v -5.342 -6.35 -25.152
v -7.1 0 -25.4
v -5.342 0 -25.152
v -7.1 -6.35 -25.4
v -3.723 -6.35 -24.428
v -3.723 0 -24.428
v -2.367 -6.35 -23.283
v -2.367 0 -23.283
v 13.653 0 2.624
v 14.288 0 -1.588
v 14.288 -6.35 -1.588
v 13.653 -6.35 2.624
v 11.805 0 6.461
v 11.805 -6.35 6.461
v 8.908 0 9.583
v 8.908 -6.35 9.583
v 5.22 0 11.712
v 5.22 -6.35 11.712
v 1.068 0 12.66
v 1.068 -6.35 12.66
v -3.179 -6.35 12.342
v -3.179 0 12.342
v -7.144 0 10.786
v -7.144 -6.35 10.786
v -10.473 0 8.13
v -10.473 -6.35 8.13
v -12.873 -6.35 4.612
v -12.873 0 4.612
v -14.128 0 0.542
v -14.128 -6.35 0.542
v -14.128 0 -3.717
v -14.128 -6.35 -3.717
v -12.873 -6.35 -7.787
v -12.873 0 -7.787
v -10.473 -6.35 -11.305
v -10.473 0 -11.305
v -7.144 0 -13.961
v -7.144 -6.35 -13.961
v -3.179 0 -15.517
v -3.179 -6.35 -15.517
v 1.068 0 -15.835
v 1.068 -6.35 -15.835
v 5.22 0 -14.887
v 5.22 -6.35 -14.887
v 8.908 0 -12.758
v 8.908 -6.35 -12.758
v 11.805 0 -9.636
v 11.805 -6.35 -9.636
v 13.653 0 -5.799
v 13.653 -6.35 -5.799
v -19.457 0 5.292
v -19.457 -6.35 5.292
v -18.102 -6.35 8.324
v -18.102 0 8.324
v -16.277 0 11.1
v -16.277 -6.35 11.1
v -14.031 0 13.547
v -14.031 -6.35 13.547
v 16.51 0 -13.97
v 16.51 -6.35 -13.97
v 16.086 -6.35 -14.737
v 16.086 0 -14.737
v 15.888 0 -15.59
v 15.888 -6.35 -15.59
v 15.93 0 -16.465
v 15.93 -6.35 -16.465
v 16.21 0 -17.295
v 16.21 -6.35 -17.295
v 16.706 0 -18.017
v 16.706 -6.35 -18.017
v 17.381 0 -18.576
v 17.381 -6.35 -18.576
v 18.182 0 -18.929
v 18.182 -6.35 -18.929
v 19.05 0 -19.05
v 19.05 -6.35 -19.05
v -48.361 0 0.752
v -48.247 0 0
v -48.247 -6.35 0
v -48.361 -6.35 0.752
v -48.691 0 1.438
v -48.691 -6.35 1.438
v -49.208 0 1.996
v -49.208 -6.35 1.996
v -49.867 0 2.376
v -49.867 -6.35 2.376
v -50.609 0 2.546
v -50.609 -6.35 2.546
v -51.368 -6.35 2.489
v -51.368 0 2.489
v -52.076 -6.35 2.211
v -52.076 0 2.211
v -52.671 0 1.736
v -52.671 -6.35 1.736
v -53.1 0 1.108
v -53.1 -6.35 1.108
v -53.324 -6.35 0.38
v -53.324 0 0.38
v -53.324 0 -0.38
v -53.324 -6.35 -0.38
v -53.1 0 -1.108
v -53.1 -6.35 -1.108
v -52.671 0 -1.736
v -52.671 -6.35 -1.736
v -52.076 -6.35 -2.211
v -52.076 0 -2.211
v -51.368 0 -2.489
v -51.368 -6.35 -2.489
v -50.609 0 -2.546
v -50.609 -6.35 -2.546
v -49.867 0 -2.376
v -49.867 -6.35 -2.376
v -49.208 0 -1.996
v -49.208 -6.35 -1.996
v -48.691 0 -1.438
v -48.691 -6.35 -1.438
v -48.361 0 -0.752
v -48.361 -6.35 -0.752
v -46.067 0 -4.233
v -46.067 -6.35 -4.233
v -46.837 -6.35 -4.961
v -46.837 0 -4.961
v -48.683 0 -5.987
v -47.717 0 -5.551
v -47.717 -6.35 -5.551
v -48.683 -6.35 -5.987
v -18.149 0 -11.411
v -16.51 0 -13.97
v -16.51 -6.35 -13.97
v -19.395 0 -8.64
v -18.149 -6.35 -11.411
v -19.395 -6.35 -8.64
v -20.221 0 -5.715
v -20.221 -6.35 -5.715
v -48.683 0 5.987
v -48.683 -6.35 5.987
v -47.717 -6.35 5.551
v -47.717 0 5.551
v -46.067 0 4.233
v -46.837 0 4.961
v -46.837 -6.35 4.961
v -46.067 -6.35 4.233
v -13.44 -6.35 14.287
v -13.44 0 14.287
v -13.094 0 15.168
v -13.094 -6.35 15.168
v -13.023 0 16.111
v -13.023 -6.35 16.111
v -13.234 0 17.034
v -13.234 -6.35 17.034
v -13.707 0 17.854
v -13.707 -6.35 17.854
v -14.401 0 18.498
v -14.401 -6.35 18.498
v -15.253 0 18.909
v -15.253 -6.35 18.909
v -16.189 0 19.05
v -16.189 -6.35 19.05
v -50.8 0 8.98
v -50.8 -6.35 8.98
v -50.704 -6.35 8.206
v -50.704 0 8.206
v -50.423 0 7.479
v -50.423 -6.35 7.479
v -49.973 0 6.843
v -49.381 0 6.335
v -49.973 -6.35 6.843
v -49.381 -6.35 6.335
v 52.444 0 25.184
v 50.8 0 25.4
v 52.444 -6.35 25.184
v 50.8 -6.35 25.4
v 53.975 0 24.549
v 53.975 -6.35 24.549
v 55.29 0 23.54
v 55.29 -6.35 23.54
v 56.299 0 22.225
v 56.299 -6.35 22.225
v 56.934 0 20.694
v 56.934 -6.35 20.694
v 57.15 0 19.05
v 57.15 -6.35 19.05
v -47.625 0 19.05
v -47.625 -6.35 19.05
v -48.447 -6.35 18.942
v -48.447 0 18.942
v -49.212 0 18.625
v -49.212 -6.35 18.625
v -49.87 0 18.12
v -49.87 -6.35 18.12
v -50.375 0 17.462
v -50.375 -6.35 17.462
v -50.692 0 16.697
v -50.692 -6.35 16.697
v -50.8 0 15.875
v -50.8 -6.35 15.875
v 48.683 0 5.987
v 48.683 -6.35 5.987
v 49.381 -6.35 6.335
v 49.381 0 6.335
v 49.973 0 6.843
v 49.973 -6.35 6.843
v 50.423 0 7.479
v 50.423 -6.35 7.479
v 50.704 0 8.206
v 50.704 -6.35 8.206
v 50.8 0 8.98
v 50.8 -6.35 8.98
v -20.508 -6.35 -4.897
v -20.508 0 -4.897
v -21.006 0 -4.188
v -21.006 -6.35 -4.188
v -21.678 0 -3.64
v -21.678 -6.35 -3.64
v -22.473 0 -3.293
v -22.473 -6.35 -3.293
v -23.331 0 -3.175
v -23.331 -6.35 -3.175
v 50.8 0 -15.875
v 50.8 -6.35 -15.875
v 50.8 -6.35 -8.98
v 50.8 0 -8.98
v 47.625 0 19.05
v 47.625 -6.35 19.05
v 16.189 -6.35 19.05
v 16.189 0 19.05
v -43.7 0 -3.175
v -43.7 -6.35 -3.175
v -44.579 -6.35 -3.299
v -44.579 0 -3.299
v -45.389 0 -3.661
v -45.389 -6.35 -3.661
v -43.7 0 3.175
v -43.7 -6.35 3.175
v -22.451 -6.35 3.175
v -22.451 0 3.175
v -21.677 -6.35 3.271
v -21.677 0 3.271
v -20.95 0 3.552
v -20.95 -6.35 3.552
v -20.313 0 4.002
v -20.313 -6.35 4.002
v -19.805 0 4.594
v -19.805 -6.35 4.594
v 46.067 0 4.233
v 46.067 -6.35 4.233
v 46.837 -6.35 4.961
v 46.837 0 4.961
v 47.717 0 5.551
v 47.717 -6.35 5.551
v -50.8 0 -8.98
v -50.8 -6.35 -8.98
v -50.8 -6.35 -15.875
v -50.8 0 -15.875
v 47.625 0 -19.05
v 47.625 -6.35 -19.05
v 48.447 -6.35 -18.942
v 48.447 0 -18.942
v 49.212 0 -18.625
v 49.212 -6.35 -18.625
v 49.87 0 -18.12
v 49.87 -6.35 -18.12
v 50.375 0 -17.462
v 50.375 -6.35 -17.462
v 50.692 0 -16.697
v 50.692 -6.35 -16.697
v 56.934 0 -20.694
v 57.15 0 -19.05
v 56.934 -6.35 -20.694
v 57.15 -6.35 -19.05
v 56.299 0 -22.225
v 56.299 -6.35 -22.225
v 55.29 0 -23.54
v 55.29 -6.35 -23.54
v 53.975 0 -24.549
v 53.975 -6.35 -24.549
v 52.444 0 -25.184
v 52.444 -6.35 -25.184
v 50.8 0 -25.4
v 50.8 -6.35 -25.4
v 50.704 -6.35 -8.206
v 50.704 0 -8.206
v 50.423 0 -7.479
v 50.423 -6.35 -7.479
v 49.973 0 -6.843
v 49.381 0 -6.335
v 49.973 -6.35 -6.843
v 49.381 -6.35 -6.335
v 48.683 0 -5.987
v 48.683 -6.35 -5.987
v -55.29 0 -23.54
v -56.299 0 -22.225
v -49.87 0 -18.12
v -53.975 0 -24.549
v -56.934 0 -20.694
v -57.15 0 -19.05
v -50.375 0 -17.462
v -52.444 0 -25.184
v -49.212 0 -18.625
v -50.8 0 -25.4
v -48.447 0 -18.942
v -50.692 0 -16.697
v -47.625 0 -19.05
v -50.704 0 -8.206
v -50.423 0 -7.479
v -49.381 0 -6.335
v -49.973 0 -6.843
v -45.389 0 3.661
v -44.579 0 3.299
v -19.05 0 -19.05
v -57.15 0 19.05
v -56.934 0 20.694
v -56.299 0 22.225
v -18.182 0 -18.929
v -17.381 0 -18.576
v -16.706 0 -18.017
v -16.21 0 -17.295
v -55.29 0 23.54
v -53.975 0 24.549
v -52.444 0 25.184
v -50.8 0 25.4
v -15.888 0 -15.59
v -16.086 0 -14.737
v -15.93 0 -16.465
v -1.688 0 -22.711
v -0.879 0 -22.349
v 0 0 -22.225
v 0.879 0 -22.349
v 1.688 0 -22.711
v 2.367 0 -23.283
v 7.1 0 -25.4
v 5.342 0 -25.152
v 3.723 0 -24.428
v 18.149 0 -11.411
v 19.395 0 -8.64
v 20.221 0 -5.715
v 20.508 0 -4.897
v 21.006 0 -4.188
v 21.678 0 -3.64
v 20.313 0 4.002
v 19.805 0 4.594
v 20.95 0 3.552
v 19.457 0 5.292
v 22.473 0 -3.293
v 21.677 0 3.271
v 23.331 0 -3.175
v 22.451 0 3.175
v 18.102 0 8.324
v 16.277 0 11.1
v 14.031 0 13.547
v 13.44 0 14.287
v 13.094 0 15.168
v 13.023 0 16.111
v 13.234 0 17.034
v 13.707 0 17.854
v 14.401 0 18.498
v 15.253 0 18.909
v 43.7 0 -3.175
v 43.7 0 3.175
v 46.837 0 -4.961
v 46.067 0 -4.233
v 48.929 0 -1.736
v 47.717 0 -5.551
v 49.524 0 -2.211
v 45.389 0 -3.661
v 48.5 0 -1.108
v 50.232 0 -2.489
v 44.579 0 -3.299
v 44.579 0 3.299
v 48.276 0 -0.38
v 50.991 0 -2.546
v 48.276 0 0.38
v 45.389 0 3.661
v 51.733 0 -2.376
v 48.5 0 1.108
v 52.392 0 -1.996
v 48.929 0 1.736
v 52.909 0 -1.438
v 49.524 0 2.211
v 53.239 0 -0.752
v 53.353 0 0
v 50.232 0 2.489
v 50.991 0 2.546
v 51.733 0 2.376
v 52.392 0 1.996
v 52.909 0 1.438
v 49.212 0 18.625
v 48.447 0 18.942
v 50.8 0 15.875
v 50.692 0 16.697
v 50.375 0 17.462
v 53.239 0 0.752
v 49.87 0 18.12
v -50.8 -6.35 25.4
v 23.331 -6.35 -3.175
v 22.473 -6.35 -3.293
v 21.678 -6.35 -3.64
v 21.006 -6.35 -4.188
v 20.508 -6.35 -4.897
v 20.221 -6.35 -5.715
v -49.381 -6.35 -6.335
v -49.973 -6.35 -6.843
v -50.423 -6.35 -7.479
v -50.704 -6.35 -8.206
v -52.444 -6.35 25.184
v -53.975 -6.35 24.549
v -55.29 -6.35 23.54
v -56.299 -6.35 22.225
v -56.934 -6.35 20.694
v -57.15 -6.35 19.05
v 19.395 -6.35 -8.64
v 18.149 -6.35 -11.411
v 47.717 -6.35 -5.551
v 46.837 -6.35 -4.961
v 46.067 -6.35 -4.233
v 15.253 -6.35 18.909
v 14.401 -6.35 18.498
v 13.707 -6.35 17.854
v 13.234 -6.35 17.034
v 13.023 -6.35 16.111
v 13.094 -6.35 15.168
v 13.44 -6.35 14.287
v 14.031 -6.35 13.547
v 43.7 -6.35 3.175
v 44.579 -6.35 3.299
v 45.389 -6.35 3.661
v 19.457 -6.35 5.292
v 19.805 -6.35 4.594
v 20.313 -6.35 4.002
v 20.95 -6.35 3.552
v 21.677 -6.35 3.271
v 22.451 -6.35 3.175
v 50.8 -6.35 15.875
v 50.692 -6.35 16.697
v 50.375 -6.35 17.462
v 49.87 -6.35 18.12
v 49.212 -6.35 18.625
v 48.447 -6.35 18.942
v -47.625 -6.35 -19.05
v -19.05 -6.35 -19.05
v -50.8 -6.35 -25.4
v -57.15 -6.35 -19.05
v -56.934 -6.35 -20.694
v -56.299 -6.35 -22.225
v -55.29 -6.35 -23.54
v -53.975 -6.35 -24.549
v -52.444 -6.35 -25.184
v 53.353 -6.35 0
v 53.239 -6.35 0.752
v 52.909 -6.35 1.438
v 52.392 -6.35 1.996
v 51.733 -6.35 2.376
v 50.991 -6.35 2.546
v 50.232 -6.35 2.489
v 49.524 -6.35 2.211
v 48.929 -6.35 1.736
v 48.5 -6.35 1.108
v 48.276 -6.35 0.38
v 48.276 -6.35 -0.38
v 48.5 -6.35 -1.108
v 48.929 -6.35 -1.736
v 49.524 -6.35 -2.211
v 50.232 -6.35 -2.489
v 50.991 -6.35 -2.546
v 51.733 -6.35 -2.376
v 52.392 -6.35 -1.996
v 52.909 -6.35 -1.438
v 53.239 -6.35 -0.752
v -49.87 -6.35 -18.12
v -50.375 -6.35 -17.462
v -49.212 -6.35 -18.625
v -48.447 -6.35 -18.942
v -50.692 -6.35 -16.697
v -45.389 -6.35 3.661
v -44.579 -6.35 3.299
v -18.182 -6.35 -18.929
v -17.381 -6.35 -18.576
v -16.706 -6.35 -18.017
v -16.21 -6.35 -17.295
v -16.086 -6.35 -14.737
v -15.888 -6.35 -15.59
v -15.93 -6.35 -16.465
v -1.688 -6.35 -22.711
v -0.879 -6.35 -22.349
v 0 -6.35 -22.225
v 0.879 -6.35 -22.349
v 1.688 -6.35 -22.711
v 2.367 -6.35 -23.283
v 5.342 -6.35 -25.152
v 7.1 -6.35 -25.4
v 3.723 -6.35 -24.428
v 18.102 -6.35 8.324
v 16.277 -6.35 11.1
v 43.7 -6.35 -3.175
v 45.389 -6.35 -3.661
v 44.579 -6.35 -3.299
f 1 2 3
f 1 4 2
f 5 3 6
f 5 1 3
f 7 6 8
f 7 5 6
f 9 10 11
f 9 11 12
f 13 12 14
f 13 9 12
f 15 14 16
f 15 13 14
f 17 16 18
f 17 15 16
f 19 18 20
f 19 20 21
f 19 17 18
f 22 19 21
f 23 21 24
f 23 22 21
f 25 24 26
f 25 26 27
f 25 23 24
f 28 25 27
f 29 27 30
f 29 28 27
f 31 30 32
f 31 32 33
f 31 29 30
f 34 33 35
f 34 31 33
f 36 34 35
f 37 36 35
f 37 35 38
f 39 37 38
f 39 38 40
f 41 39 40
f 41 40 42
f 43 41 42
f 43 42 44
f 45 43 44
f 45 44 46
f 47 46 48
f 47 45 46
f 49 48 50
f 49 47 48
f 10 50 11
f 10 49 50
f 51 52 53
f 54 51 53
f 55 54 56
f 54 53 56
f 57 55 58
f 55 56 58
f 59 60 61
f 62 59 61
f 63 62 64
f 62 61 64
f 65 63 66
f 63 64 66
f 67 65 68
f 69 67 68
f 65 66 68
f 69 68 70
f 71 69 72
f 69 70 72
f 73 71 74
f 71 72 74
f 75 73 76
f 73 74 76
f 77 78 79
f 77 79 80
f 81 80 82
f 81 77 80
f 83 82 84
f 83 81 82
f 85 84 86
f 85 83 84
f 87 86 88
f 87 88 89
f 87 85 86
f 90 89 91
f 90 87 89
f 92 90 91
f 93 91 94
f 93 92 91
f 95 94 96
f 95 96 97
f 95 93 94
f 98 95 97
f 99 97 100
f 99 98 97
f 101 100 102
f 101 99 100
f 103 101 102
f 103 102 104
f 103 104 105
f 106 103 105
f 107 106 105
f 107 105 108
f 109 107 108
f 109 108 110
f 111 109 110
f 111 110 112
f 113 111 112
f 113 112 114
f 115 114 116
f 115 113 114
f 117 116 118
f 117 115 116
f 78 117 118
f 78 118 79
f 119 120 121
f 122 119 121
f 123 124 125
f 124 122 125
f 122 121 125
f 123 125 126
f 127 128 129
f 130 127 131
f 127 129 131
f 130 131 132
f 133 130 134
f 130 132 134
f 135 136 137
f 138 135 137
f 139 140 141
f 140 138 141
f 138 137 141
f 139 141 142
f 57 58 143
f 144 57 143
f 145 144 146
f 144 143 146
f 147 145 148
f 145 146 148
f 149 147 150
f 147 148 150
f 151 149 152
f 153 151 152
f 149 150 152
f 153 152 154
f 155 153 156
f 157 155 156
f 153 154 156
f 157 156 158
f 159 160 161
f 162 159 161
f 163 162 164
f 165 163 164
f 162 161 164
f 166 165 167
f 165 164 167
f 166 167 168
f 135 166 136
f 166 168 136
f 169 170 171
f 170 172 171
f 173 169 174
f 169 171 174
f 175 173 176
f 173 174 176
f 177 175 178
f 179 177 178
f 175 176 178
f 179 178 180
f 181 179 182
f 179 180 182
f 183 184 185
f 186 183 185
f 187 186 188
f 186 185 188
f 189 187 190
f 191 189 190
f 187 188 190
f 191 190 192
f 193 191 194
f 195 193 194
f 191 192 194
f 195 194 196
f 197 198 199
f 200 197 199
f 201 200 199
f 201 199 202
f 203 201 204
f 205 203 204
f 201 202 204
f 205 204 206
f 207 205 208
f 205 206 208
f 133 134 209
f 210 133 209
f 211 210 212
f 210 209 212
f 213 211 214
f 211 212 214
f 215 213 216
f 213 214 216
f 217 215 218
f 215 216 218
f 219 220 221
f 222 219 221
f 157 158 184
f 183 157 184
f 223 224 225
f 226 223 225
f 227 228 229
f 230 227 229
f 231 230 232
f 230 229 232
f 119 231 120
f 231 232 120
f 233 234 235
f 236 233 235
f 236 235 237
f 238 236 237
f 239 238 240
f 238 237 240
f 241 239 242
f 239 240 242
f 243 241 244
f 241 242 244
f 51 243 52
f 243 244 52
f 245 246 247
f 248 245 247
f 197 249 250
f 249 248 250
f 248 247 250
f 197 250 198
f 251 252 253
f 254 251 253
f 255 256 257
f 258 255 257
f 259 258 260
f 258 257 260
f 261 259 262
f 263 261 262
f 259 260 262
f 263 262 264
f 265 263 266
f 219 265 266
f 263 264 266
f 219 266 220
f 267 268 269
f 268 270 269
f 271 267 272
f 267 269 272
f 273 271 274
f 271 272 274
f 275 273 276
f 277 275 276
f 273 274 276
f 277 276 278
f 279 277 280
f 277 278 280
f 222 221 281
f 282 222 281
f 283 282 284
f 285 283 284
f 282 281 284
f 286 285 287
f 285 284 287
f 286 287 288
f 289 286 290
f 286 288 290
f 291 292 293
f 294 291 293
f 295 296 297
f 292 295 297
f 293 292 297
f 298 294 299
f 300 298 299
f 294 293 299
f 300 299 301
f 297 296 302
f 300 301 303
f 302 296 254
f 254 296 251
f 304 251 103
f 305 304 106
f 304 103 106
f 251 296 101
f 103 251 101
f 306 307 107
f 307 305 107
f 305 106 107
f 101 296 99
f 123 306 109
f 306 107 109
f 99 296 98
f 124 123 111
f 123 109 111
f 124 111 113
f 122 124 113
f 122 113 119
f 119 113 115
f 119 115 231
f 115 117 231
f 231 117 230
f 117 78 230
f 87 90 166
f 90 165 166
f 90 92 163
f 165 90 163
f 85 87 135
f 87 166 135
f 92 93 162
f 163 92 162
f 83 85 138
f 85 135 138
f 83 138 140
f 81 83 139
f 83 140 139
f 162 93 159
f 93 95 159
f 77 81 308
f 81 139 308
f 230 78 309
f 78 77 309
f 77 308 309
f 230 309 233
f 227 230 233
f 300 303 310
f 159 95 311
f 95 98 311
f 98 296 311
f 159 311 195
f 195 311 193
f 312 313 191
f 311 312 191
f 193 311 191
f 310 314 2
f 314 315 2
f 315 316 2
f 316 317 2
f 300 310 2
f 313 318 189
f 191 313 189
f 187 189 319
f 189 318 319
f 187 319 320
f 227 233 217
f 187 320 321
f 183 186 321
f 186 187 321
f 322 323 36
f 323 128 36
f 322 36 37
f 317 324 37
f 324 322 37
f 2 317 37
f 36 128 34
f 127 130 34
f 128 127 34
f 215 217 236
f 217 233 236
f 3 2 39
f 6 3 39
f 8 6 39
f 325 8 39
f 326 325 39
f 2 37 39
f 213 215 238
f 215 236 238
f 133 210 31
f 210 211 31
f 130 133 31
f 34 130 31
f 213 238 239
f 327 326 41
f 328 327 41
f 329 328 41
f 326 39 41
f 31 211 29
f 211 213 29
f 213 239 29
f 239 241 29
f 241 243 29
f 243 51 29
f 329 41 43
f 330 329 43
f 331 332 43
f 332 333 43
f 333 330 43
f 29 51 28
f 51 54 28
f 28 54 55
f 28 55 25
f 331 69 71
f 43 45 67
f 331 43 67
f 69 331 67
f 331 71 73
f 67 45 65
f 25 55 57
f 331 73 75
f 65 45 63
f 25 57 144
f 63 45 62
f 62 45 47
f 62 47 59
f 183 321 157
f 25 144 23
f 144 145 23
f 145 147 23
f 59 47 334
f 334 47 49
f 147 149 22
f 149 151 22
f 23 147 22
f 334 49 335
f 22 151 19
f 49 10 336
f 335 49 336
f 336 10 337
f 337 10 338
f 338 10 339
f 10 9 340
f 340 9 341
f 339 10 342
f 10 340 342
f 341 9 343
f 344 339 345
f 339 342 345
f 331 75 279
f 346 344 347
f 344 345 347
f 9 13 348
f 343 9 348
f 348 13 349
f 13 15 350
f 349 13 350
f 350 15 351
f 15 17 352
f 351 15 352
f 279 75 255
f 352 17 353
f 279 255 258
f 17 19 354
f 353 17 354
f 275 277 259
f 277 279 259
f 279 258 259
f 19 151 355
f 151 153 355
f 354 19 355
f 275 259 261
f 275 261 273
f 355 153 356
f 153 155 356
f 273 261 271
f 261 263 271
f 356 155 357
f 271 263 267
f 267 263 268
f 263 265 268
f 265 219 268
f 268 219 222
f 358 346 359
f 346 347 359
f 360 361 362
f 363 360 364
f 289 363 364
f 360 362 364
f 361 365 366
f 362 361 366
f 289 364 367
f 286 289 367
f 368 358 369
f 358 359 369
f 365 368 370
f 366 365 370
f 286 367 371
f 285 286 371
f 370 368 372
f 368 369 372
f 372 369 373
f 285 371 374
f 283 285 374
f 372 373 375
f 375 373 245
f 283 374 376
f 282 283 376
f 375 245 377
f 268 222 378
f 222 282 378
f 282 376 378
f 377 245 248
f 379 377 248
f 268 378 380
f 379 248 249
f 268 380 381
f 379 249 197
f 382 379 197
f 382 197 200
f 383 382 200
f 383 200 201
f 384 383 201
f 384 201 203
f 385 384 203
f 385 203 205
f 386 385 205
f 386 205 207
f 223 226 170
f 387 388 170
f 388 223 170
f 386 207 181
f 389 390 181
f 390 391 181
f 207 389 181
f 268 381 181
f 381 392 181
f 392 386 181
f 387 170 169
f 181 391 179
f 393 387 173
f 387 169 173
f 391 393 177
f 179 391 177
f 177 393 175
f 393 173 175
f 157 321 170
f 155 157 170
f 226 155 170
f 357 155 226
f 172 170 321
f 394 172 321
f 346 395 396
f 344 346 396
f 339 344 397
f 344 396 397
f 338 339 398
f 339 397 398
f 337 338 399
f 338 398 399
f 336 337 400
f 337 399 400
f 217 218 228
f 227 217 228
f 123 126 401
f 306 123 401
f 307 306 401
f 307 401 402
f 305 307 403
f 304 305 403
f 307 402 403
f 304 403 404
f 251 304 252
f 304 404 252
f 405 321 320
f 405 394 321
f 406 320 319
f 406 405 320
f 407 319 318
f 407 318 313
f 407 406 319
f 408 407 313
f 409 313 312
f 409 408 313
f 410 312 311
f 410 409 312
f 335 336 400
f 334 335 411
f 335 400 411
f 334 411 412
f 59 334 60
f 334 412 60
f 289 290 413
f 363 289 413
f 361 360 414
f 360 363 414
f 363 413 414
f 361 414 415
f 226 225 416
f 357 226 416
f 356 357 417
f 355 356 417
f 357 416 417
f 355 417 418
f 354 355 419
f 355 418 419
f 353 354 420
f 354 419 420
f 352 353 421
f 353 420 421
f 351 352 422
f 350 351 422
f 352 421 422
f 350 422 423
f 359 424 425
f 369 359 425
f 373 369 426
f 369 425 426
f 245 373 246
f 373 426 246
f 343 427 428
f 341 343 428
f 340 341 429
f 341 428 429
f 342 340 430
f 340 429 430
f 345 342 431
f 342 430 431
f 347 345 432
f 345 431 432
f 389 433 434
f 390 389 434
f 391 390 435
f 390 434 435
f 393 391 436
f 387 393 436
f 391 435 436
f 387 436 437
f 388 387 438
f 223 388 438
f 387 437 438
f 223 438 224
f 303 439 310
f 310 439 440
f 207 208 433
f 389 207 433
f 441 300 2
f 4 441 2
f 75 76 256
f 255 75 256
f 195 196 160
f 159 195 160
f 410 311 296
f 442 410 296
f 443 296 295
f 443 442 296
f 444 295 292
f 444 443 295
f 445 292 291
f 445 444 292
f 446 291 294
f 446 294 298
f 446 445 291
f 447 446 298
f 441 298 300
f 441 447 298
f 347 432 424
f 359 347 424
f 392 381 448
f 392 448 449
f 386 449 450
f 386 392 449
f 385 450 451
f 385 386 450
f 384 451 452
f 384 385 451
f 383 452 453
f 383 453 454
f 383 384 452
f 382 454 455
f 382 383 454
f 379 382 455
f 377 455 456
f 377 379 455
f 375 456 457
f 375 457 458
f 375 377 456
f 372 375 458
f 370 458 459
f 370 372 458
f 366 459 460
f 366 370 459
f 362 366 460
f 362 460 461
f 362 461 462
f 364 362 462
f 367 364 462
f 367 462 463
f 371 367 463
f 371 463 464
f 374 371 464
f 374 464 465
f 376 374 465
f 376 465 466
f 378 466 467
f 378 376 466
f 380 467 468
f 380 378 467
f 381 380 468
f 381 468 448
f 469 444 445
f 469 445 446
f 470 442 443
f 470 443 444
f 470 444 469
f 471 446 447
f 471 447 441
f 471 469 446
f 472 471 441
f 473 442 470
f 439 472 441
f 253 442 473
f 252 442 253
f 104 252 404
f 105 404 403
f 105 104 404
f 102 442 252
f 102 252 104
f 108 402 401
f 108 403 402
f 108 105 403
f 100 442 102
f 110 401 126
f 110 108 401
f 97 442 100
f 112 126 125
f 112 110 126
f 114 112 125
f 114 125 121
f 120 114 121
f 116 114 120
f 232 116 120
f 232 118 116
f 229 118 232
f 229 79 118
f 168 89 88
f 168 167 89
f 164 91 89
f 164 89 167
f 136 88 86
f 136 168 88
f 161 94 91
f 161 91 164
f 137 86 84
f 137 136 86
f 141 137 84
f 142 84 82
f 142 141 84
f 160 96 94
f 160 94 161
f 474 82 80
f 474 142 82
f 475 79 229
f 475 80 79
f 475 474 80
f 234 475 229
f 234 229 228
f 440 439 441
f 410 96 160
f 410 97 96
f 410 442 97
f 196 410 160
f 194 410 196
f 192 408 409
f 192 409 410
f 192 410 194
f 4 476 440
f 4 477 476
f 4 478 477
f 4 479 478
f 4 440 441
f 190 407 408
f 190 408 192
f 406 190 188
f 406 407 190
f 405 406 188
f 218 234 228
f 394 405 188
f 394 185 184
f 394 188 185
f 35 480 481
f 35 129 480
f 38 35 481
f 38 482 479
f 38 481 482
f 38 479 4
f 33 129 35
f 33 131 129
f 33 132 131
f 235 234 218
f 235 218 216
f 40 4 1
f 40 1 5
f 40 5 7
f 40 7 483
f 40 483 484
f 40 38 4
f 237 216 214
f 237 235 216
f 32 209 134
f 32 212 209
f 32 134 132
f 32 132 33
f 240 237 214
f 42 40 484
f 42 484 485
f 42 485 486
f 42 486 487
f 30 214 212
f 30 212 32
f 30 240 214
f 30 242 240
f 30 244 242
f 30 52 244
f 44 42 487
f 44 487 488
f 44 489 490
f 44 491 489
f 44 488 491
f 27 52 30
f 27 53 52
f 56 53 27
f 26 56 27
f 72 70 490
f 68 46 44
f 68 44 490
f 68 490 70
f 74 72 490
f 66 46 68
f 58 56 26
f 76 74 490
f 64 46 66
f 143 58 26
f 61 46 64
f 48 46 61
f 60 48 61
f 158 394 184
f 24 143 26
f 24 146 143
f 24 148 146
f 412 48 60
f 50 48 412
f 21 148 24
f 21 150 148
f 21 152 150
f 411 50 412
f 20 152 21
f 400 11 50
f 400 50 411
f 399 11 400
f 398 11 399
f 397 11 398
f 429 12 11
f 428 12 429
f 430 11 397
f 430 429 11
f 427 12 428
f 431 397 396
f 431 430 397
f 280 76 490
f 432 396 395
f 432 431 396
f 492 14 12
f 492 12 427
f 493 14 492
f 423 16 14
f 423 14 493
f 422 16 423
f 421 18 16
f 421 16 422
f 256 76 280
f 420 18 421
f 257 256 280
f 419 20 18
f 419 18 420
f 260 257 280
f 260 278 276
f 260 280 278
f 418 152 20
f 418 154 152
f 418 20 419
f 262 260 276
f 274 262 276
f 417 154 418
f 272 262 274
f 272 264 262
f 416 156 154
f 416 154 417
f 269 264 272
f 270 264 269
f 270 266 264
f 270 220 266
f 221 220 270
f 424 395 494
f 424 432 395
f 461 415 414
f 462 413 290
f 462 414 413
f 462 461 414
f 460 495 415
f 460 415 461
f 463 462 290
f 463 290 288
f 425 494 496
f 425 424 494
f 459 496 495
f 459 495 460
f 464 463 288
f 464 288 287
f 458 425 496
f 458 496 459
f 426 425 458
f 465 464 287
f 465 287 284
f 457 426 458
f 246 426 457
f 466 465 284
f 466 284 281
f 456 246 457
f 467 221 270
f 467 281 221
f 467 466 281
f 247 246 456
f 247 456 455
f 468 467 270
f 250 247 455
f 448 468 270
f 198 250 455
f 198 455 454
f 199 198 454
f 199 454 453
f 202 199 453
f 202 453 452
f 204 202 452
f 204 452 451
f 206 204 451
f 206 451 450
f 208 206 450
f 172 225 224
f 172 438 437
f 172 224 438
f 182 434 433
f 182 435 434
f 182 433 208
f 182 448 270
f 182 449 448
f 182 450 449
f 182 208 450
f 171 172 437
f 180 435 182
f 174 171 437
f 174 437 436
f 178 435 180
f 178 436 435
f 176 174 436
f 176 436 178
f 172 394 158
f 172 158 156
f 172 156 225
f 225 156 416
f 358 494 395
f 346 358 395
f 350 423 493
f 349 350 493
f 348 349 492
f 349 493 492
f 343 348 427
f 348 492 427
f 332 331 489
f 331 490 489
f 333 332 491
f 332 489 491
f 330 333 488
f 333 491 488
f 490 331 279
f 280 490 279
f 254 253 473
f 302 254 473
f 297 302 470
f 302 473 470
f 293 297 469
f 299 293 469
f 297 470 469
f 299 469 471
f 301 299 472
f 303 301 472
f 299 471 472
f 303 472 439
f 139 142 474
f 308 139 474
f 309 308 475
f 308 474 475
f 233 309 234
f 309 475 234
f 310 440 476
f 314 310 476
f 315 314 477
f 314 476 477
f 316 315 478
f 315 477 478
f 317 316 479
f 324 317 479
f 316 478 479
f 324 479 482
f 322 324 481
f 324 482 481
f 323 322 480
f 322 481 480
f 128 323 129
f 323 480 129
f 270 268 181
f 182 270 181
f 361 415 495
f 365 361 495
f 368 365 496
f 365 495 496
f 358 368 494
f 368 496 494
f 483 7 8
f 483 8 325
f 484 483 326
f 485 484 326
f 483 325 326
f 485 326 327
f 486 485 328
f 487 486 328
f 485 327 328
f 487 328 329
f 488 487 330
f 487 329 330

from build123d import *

# Parameters (mm, degrees)
F0_R     = 14.2875
F0_R_2   = 2.5527
F1_DEPTH = 6.35
F2_R     = 6.35
F4_DEPTH = 25.4


with BuildPart() as f1:
    # F0 (on Front) → F1 (new body)
    with BuildSketch(Plane.XZ):
        with BuildLine():
            Line((57.15, 25.4), (-57.15, 25.4))
            Line((-57.15, 25.4), (-57.15, -25.4))
            Line((-57.15, -25.4), (-3.175, -25.4))
            ThreePointArc((-3.175, -25.4), (0, -22.225), (3.175, -25.4))
            Line((3.175, -25.4), (57.15, -25.4))
            Line((57.15, -25.4), (57.15, 25.4))
        make_face()
        with Locations((0, -1.5875)):
            Circle(F0_R, mode=Mode.SUBTRACT)
        with Locations((-50.8, 0)):
            Circle(F0_R_2, mode=Mode.SUBTRACT)
        with Locations((50.8, 0)):
            Circle(F0_R_2, mode=Mode.SUBTRACT)
    extrude(amount=F1_DEPTH)

    # F2
    f2_edges = [f1.edges().sort_by_distance(p)[0] for p in [
        (-57.15, -3.175, 25.4),
        (-57.15, -3.175, -25.4),
        (57.15, -3.175, -25.4),
        (57.15, -3.175, 25.4),
        (-3.175, -3.175, -25.4),
        (3.175, -3.175, -25.4),
    ]]
    fillet(f2_edges, radius=F2_R)

    # F3 (on face) → F4 (cut)
    with BuildSketch(Plane.XZ.offset(6.35)):
        with BuildLine():
            ThreePointArc((-46.066989, 4.233333), (-44.996672, 3.451635), (-43.700484, 3.175))
            Line((-43.700484, 3.175), (-22.45064, 3.175))
            ThreePointArc((-22.45064, 3.175), (-20.617553, 3.757623), (-19.457222, 5.291667))
            ThreePointArc((-19.457222, 5.291667), (-17.245237, 9.748647), (-14.030802, 13.546667))
            ThreePointArc((-14.030802, 13.546667), (-13.233623, 17.034346), (-16.189387, 19.05))
            Line((-16.189387, 19.05), (-47.625, 19.05))
            ThreePointArc((-47.625, 19.05), (-49.870064, 18.120064), (-50.8, 15.875))
            Line((-50.8, 15.875), (-50.8, 8.980256))
            ThreePointArc((-50.8, 8.980256), (-50.217377, 7.147169), (-48.683333, 5.986837))
            ThreePointArc((-48.683333, 5.986837), (-47.264719, 5.274873), (-46.066989, 4.233333))
        make_face()
        with BuildLine():
            Line((-23.33139, -3.175), (-43.700484, -3.175))
            ThreePointArc((-43.700484, -3.175), (-44.996672, -3.451635), (-46.066989, -4.233333))
            ThreePointArc((-46.066989, -4.233333), (-47.264719, -5.274873), (-48.683333, -5.986837))
            ThreePointArc((-48.683333, -5.986837), (-50.217377, -7.147169), (-50.8, -8.980256))
            Line((-50.8, -8.980256), (-50.8, -15.875))
            ThreePointArc((-50.8, -15.875), (-49.870064, -18.120064), (-47.625, -19.05))
            Line((-47.625, -19.05), (-19.05, -19.05))
            ThreePointArc((-19.05, -19.05), (-16.210194, -17.294903), (-16.51, -13.97))
            ThreePointArc((-16.51, -13.97), (-18.823373, -10.048413), (-20.220538, -5.715))
            ThreePointArc((-20.220538, -5.715), (-21.323343, -3.890656), (-23.33139, -3.175))
        make_face()
        with BuildLine():
            ThreePointArc((43.700484, 3.175), (44.996672, 3.451635), (46.066989, 4.233333))
            ThreePointArc((46.066989, 4.233333), (47.264719, 5.274873), (48.683333, 5.986837))
            ThreePointArc((48.683333, 5.986837), (50.217377, 7.147169), (50.8, 8.980256))
            Line((50.8, 8.980256), (50.8, 15.875))
            ThreePointArc((50.8, 15.875), (49.870064, 18.120064), (47.625, 19.05))
            Line((47.625, 19.05), (16.189387, 19.05))
            ThreePointArc((16.189387, 19.05), (13.233623, 17.034346), (14.030802, 13.546667))
            ThreePointArc((14.030802, 13.546667), (17.245237, 9.748647), (19.457222, 5.291667))
            ThreePointArc((19.457222, 5.291667), (20.617553, 3.757623), (22.45064, 3.175))
            Line((22.45064, 3.175), (43.700484, 3.175))
        make_face()
        with BuildLine():
            ThreePointArc((50.8, -8.980256), (50.217377, -7.147169), (48.683333, -5.986837))
            ThreePointArc((48.683333, -5.986837), (47.264719, -5.274873), (46.066989, -4.233333))
            ThreePointArc((46.066989, -4.233333), (44.996672, -3.451635), (43.700484, -3.175))
            Line((43.700484, -3.175), (23.33139, -3.175))
            ThreePointArc((23.33139, -3.175), (21.323343, -3.890656), (20.220538, -5.715))
            ThreePointArc((20.220538, -5.715), (18.823373, -10.048413), (16.51, -13.97))
            ThreePointArc((16.51, -13.97), (16.210194, -17.294903), (19.05, -19.05))
            Line((19.05, -19.05), (47.625, -19.05))
            ThreePointArc((47.625, -19.05), (49.870064, -18.120064), (50.8, -15.875))
            Line((50.8, -15.875), (50.8, -8.980256))
        make_face()
    extrude(amount=-F4_DEPTH, mode=Mode.SUBTRACT)


solid = f1.part
